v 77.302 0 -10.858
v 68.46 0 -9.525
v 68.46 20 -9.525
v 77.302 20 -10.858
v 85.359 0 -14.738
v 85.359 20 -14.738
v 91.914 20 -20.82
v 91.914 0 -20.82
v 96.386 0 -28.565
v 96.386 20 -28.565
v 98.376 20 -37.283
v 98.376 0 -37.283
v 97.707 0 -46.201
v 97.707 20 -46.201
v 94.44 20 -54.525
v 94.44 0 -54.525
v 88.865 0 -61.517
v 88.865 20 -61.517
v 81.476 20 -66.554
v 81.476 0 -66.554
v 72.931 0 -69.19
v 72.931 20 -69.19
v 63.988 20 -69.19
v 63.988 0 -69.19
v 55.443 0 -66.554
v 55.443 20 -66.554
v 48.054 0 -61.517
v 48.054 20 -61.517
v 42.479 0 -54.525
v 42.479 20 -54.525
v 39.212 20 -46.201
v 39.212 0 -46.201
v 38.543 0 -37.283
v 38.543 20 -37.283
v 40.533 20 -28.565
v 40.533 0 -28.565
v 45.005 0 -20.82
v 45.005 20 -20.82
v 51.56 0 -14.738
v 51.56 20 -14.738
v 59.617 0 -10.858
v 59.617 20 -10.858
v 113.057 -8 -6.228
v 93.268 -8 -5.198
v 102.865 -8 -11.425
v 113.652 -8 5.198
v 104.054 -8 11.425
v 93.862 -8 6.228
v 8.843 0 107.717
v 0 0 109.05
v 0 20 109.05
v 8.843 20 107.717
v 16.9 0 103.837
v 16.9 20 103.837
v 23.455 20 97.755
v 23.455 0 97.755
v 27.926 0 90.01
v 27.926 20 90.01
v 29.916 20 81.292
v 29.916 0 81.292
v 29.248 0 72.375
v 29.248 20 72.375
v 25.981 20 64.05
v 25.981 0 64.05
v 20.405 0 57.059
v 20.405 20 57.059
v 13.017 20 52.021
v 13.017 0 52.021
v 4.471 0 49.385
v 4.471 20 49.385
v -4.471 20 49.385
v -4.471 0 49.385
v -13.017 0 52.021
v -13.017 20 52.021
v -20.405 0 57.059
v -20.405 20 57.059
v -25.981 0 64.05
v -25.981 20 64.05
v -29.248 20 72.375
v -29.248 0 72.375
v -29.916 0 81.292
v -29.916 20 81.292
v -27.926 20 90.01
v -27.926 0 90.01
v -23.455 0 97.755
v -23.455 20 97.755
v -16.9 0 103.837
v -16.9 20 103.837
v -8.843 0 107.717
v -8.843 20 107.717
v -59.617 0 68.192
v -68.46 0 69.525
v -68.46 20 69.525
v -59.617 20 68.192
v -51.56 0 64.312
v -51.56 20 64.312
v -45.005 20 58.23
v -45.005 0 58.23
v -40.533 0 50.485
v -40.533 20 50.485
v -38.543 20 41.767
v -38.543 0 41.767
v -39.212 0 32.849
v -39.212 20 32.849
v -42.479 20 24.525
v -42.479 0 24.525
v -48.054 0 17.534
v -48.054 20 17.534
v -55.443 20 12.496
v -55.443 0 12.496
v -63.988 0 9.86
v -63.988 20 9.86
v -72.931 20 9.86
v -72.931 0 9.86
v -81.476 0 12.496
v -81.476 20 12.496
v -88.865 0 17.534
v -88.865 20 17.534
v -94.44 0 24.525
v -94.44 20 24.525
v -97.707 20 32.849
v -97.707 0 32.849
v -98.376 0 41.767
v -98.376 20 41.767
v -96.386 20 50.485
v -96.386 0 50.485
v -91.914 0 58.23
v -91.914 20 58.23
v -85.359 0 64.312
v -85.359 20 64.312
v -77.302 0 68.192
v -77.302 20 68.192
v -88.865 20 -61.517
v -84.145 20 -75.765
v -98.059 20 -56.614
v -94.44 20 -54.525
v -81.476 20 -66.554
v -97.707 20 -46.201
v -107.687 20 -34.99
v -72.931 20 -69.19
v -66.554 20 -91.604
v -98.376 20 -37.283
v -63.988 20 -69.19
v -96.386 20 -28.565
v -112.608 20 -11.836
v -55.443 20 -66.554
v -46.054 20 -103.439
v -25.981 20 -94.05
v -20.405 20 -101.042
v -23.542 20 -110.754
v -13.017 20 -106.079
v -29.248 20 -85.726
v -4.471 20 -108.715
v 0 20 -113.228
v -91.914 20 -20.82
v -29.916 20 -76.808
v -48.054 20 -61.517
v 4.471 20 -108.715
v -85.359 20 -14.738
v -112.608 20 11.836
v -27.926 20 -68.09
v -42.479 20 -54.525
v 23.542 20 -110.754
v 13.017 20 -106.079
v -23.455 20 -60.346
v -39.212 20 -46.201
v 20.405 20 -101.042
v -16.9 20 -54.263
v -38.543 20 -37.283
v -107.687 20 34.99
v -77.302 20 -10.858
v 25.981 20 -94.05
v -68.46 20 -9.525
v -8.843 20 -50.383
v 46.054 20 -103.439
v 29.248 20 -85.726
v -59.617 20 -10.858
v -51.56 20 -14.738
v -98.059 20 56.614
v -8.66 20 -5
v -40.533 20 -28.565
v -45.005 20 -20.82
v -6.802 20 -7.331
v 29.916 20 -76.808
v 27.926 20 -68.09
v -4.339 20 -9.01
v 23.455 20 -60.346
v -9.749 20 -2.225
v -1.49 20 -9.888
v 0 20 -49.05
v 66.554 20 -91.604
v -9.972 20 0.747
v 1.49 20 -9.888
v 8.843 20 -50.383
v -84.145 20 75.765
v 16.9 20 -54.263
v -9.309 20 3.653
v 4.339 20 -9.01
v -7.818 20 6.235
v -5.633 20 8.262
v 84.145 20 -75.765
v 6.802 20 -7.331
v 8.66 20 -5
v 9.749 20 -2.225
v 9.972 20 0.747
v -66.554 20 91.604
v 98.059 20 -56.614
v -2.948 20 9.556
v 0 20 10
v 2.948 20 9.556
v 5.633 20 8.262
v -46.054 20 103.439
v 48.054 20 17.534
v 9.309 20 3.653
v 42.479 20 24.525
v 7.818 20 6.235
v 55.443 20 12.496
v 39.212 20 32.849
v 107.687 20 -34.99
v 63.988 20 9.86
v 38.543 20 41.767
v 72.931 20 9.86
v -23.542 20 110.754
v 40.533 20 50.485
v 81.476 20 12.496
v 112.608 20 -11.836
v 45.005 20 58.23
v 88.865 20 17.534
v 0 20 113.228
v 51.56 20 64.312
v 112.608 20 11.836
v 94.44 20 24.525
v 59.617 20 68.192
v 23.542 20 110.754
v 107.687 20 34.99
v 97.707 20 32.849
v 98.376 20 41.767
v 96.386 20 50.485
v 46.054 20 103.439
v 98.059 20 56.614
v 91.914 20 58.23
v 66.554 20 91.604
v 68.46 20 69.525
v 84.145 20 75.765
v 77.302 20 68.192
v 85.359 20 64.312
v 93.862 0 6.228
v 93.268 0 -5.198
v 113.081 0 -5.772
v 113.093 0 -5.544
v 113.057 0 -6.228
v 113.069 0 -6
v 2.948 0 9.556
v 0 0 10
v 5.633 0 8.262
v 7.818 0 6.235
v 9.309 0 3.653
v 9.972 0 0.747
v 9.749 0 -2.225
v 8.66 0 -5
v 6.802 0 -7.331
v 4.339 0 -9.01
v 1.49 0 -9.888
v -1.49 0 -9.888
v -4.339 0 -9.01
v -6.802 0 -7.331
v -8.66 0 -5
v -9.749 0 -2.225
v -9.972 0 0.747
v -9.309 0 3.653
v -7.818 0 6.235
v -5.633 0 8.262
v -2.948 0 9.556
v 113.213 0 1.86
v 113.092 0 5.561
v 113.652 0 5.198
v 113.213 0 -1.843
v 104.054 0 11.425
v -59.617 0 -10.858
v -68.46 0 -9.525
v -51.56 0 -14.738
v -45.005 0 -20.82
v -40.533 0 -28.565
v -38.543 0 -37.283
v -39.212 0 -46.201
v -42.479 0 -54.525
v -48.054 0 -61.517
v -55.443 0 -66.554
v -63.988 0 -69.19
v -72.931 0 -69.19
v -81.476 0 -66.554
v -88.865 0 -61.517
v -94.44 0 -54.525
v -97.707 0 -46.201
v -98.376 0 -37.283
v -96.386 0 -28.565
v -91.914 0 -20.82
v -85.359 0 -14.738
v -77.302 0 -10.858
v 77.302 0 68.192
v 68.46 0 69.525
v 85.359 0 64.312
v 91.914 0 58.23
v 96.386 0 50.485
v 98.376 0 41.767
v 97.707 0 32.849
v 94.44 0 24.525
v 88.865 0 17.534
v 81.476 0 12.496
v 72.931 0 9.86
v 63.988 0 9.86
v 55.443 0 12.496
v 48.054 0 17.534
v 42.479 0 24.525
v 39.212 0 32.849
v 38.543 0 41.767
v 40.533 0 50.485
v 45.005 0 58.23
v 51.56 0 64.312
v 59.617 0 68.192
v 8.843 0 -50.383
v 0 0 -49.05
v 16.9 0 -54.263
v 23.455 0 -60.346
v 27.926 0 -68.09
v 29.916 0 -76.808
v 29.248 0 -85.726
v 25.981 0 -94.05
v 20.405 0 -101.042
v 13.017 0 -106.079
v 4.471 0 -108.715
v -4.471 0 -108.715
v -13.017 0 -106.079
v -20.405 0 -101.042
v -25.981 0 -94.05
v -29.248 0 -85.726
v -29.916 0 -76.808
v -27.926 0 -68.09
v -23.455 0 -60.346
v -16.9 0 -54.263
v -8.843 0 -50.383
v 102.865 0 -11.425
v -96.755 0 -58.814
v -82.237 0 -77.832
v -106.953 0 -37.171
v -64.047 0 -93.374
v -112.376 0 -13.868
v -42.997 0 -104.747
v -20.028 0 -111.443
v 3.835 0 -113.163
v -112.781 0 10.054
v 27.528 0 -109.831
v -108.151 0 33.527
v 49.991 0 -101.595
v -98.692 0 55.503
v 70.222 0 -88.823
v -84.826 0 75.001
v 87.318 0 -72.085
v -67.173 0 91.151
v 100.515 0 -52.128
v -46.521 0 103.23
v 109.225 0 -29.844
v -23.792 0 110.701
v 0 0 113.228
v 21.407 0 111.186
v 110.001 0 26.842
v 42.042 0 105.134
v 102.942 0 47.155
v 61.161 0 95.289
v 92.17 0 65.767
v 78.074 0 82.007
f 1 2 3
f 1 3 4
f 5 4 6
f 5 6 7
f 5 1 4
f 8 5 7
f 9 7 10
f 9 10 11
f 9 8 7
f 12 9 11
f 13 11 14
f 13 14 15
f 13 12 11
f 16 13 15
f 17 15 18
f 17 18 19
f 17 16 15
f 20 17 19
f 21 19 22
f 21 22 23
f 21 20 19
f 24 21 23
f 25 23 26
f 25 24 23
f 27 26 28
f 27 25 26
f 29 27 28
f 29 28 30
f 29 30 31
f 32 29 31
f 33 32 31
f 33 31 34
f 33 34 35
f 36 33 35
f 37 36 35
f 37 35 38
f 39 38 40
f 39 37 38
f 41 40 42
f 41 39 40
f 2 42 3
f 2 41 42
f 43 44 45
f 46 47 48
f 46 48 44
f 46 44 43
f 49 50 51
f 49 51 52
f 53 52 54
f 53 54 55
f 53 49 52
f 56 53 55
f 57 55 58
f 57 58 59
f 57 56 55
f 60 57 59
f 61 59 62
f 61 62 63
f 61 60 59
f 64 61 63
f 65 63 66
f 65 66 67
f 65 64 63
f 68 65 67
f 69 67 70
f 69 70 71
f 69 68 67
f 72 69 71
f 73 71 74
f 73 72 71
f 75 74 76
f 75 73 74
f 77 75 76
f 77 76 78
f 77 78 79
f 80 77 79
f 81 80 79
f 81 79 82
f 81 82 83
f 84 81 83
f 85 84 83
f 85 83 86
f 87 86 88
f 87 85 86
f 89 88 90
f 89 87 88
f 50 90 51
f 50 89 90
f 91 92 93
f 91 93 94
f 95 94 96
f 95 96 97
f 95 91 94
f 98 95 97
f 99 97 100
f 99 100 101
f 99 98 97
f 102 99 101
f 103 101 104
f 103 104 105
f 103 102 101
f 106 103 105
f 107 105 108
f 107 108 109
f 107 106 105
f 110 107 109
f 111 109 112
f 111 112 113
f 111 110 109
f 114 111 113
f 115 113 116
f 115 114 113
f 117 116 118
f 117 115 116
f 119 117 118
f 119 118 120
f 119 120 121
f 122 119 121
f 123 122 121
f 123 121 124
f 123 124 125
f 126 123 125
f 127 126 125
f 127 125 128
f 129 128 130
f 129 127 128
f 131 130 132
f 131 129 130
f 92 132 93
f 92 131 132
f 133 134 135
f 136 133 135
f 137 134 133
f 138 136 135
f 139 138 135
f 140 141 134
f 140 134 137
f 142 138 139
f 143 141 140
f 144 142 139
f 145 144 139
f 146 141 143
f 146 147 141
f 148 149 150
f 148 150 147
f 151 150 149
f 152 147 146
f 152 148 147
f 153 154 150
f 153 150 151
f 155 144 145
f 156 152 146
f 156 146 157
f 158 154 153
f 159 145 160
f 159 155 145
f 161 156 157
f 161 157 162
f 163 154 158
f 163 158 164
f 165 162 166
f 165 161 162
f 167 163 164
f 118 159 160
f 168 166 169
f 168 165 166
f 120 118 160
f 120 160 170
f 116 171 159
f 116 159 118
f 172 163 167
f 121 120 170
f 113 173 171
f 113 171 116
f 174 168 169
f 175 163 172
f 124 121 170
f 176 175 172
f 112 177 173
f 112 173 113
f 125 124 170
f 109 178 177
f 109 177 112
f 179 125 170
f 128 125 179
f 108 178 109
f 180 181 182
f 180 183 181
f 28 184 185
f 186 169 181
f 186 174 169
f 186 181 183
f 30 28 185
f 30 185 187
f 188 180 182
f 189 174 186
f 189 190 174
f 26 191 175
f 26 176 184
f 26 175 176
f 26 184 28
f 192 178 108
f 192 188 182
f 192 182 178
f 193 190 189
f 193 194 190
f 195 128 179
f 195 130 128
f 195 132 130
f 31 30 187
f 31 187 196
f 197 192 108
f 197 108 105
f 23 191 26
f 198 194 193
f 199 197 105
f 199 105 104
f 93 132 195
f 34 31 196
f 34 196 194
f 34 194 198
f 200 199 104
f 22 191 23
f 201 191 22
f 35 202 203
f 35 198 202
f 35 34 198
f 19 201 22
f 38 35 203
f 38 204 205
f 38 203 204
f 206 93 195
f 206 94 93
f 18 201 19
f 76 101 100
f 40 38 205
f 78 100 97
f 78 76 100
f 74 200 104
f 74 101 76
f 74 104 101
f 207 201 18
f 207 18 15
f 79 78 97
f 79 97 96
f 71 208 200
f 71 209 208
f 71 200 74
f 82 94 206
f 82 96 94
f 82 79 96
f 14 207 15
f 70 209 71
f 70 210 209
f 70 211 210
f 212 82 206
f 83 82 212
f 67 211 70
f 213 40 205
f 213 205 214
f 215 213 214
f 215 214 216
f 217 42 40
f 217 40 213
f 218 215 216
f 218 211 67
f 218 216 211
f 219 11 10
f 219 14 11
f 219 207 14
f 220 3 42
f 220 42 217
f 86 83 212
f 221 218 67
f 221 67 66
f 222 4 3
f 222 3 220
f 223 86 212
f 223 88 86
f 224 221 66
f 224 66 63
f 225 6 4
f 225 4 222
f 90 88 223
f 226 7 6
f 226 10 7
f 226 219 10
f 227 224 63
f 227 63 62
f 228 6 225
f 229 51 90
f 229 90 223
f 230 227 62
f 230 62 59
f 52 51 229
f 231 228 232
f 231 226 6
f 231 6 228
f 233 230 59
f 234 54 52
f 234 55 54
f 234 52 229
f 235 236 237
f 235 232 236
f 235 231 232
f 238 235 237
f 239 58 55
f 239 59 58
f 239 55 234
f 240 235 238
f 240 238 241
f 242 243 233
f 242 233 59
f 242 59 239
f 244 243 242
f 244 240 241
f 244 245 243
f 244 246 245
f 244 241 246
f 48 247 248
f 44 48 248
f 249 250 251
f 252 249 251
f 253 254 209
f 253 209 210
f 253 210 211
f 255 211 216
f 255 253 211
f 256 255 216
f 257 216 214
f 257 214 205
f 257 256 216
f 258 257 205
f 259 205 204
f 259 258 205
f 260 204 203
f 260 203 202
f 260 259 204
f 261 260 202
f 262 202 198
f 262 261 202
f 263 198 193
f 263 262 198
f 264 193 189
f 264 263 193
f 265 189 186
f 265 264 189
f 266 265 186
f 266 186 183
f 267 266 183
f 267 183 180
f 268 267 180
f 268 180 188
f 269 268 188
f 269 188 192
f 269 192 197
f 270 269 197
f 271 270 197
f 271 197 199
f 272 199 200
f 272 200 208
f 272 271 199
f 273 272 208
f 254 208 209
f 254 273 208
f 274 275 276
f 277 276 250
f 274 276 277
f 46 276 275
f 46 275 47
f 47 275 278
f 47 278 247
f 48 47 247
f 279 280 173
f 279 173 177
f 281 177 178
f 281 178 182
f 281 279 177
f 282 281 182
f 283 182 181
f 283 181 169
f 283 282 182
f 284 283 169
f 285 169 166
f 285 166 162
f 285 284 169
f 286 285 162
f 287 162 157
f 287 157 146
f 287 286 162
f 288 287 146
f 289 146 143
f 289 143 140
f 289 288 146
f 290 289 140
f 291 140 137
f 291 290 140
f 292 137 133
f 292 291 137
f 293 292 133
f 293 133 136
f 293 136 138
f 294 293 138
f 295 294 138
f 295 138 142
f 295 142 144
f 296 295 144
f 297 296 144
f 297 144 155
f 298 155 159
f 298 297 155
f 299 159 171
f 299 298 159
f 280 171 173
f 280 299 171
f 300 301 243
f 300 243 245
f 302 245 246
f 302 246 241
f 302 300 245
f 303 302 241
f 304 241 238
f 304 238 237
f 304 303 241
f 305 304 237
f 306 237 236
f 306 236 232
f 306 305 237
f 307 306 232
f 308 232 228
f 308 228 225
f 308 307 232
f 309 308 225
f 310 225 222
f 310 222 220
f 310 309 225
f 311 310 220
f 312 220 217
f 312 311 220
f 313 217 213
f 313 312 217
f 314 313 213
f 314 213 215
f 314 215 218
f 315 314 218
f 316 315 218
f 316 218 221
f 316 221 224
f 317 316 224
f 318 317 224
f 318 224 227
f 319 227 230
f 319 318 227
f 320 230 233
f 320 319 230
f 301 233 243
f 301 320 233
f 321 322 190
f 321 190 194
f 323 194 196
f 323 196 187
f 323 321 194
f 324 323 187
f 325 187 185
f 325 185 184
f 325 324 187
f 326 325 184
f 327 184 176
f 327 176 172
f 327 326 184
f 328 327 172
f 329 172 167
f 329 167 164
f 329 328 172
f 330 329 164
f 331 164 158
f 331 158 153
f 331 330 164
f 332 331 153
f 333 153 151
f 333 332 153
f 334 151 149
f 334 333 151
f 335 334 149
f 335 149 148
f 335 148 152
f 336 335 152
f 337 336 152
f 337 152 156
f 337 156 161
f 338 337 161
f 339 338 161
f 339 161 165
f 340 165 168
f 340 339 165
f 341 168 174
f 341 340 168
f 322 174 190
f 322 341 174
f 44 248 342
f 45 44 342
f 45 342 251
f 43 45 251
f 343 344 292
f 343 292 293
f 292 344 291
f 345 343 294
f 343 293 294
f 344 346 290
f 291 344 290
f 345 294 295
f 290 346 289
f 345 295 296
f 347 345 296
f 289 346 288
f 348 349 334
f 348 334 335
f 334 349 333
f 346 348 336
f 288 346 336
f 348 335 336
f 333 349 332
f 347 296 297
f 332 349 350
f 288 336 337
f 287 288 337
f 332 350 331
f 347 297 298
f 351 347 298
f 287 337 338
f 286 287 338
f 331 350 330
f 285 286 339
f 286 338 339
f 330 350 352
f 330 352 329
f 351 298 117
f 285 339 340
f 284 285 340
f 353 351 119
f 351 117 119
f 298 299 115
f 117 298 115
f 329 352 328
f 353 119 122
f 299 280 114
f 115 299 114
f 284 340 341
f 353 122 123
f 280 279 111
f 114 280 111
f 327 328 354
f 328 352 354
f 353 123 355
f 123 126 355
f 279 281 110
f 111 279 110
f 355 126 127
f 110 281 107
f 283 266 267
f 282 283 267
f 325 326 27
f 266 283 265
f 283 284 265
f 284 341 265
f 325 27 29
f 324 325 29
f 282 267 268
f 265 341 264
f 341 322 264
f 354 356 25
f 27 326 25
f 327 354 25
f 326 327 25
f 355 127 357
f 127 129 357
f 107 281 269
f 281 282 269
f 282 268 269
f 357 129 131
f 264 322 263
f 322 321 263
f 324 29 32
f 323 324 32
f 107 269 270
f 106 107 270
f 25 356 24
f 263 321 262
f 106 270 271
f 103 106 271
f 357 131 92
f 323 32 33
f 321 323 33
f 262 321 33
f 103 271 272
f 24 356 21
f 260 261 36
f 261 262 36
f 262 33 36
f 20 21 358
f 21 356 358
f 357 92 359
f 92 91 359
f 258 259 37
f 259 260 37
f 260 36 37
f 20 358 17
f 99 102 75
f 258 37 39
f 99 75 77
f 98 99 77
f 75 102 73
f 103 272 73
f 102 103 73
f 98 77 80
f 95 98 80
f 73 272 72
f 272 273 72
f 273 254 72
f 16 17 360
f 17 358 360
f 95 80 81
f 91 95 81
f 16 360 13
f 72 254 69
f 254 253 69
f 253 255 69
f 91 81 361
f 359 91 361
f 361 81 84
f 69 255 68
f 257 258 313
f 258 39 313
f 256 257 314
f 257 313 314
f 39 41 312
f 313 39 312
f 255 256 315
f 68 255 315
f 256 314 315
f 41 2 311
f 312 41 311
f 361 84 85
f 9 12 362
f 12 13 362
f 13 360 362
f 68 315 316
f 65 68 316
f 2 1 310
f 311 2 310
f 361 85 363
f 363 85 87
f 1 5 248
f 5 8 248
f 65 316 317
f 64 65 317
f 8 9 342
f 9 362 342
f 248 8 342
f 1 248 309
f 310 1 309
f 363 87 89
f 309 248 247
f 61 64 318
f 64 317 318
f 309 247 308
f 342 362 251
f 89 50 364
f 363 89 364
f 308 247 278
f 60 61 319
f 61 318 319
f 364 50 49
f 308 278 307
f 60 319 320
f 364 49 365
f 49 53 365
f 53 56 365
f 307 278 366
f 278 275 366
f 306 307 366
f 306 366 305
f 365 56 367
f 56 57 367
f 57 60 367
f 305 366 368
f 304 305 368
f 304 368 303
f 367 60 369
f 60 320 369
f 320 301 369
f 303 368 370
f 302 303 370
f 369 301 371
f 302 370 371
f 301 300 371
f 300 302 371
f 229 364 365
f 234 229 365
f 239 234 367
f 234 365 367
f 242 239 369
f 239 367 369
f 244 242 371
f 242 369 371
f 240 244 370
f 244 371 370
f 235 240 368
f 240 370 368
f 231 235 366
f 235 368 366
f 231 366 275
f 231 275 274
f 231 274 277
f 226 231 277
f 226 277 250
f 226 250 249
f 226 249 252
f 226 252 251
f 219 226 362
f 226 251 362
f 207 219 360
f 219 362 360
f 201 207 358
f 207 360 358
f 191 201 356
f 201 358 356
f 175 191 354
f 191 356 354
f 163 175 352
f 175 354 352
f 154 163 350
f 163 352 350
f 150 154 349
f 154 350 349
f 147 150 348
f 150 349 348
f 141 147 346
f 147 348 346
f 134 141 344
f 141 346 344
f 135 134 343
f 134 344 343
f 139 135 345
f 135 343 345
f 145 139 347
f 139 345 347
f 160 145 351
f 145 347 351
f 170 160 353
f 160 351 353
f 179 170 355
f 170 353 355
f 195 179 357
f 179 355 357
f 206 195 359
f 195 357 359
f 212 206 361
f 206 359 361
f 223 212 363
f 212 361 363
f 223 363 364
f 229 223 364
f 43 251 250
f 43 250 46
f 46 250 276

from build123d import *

# Parameters (mm, degrees)
CROQUIS1_R              = 113.228412481
CROQUIS1_R_2            = 30
CROQUIS1_R_3            = 10
SALIENTE_EXTRUIR2_DEPTH = 20
SALIENTE_EXTRUIR3_DEPTH = 8


with BuildPart() as part:
    # Croquis1 → Saliente-Extruir2 (new body)
    with BuildSketch(Plane(origin=(0, 0, 0), x_dir=(1, 0, 0), z_dir=(0, 1, 0))):
        with Locations(Location((0, 0, 0), (0, 0, 270))):
            Circle(CROQUIS1_R)
        with Locations(Location((0, 79.050232258, 0), (0, 0, 270))):
            Circle(CROQUIS1_R_2, mode=Mode.SUBTRACT)
        with Locations(Location((68.459509311, 39.525116129, 0), (0, 0, 270))):
            Circle(CROQUIS1_R_2, mode=Mode.SUBTRACT)
        with Locations(Location((68.459509311, -39.525116129, 0), (0, 0, 270))):
            Circle(CROQUIS1_R_2, mode=Mode.SUBTRACT)
        with Locations(Location((0, -79.050232258, 0), (0, 0, 270))):
            Circle(CROQUIS1_R_2, mode=Mode.SUBTRACT)
        with Locations(Location((-68.459509311, -39.525116129, 0), (0, 0, 270))):
            Circle(CROQUIS1_R_2, mode=Mode.SUBTRACT)
        with Locations(Location((-68.459509311, 39.525116129, 0), (0, 0, 270))):
            Circle(CROQUIS1_R_2, mode=Mode.SUBTRACT)
        with Locations(Location((0, 0, 0), (0, 0, 270))):
            Circle(CROQUIS1_R_3, mode=Mode.SUBTRACT)
    extrude(amount=SALIENTE_EXTRUIR2_DEPTH)

    # Croquis2 → Saliente-Extruir3 (add)
    with BuildSketch(Plane.XZ):
        Polygon((113.057016297, -6.227716999), (113.651716101, 5.197666723), (104.054393451, 11.425383723), (93.862370997, 6.227716999), (93.267671193, -5.197666723), (102.864993843, -11.425383723), align=None)
    extrude(amount=SALIENTE_EXTRUIR3_DEPTH)


solid = part.part
